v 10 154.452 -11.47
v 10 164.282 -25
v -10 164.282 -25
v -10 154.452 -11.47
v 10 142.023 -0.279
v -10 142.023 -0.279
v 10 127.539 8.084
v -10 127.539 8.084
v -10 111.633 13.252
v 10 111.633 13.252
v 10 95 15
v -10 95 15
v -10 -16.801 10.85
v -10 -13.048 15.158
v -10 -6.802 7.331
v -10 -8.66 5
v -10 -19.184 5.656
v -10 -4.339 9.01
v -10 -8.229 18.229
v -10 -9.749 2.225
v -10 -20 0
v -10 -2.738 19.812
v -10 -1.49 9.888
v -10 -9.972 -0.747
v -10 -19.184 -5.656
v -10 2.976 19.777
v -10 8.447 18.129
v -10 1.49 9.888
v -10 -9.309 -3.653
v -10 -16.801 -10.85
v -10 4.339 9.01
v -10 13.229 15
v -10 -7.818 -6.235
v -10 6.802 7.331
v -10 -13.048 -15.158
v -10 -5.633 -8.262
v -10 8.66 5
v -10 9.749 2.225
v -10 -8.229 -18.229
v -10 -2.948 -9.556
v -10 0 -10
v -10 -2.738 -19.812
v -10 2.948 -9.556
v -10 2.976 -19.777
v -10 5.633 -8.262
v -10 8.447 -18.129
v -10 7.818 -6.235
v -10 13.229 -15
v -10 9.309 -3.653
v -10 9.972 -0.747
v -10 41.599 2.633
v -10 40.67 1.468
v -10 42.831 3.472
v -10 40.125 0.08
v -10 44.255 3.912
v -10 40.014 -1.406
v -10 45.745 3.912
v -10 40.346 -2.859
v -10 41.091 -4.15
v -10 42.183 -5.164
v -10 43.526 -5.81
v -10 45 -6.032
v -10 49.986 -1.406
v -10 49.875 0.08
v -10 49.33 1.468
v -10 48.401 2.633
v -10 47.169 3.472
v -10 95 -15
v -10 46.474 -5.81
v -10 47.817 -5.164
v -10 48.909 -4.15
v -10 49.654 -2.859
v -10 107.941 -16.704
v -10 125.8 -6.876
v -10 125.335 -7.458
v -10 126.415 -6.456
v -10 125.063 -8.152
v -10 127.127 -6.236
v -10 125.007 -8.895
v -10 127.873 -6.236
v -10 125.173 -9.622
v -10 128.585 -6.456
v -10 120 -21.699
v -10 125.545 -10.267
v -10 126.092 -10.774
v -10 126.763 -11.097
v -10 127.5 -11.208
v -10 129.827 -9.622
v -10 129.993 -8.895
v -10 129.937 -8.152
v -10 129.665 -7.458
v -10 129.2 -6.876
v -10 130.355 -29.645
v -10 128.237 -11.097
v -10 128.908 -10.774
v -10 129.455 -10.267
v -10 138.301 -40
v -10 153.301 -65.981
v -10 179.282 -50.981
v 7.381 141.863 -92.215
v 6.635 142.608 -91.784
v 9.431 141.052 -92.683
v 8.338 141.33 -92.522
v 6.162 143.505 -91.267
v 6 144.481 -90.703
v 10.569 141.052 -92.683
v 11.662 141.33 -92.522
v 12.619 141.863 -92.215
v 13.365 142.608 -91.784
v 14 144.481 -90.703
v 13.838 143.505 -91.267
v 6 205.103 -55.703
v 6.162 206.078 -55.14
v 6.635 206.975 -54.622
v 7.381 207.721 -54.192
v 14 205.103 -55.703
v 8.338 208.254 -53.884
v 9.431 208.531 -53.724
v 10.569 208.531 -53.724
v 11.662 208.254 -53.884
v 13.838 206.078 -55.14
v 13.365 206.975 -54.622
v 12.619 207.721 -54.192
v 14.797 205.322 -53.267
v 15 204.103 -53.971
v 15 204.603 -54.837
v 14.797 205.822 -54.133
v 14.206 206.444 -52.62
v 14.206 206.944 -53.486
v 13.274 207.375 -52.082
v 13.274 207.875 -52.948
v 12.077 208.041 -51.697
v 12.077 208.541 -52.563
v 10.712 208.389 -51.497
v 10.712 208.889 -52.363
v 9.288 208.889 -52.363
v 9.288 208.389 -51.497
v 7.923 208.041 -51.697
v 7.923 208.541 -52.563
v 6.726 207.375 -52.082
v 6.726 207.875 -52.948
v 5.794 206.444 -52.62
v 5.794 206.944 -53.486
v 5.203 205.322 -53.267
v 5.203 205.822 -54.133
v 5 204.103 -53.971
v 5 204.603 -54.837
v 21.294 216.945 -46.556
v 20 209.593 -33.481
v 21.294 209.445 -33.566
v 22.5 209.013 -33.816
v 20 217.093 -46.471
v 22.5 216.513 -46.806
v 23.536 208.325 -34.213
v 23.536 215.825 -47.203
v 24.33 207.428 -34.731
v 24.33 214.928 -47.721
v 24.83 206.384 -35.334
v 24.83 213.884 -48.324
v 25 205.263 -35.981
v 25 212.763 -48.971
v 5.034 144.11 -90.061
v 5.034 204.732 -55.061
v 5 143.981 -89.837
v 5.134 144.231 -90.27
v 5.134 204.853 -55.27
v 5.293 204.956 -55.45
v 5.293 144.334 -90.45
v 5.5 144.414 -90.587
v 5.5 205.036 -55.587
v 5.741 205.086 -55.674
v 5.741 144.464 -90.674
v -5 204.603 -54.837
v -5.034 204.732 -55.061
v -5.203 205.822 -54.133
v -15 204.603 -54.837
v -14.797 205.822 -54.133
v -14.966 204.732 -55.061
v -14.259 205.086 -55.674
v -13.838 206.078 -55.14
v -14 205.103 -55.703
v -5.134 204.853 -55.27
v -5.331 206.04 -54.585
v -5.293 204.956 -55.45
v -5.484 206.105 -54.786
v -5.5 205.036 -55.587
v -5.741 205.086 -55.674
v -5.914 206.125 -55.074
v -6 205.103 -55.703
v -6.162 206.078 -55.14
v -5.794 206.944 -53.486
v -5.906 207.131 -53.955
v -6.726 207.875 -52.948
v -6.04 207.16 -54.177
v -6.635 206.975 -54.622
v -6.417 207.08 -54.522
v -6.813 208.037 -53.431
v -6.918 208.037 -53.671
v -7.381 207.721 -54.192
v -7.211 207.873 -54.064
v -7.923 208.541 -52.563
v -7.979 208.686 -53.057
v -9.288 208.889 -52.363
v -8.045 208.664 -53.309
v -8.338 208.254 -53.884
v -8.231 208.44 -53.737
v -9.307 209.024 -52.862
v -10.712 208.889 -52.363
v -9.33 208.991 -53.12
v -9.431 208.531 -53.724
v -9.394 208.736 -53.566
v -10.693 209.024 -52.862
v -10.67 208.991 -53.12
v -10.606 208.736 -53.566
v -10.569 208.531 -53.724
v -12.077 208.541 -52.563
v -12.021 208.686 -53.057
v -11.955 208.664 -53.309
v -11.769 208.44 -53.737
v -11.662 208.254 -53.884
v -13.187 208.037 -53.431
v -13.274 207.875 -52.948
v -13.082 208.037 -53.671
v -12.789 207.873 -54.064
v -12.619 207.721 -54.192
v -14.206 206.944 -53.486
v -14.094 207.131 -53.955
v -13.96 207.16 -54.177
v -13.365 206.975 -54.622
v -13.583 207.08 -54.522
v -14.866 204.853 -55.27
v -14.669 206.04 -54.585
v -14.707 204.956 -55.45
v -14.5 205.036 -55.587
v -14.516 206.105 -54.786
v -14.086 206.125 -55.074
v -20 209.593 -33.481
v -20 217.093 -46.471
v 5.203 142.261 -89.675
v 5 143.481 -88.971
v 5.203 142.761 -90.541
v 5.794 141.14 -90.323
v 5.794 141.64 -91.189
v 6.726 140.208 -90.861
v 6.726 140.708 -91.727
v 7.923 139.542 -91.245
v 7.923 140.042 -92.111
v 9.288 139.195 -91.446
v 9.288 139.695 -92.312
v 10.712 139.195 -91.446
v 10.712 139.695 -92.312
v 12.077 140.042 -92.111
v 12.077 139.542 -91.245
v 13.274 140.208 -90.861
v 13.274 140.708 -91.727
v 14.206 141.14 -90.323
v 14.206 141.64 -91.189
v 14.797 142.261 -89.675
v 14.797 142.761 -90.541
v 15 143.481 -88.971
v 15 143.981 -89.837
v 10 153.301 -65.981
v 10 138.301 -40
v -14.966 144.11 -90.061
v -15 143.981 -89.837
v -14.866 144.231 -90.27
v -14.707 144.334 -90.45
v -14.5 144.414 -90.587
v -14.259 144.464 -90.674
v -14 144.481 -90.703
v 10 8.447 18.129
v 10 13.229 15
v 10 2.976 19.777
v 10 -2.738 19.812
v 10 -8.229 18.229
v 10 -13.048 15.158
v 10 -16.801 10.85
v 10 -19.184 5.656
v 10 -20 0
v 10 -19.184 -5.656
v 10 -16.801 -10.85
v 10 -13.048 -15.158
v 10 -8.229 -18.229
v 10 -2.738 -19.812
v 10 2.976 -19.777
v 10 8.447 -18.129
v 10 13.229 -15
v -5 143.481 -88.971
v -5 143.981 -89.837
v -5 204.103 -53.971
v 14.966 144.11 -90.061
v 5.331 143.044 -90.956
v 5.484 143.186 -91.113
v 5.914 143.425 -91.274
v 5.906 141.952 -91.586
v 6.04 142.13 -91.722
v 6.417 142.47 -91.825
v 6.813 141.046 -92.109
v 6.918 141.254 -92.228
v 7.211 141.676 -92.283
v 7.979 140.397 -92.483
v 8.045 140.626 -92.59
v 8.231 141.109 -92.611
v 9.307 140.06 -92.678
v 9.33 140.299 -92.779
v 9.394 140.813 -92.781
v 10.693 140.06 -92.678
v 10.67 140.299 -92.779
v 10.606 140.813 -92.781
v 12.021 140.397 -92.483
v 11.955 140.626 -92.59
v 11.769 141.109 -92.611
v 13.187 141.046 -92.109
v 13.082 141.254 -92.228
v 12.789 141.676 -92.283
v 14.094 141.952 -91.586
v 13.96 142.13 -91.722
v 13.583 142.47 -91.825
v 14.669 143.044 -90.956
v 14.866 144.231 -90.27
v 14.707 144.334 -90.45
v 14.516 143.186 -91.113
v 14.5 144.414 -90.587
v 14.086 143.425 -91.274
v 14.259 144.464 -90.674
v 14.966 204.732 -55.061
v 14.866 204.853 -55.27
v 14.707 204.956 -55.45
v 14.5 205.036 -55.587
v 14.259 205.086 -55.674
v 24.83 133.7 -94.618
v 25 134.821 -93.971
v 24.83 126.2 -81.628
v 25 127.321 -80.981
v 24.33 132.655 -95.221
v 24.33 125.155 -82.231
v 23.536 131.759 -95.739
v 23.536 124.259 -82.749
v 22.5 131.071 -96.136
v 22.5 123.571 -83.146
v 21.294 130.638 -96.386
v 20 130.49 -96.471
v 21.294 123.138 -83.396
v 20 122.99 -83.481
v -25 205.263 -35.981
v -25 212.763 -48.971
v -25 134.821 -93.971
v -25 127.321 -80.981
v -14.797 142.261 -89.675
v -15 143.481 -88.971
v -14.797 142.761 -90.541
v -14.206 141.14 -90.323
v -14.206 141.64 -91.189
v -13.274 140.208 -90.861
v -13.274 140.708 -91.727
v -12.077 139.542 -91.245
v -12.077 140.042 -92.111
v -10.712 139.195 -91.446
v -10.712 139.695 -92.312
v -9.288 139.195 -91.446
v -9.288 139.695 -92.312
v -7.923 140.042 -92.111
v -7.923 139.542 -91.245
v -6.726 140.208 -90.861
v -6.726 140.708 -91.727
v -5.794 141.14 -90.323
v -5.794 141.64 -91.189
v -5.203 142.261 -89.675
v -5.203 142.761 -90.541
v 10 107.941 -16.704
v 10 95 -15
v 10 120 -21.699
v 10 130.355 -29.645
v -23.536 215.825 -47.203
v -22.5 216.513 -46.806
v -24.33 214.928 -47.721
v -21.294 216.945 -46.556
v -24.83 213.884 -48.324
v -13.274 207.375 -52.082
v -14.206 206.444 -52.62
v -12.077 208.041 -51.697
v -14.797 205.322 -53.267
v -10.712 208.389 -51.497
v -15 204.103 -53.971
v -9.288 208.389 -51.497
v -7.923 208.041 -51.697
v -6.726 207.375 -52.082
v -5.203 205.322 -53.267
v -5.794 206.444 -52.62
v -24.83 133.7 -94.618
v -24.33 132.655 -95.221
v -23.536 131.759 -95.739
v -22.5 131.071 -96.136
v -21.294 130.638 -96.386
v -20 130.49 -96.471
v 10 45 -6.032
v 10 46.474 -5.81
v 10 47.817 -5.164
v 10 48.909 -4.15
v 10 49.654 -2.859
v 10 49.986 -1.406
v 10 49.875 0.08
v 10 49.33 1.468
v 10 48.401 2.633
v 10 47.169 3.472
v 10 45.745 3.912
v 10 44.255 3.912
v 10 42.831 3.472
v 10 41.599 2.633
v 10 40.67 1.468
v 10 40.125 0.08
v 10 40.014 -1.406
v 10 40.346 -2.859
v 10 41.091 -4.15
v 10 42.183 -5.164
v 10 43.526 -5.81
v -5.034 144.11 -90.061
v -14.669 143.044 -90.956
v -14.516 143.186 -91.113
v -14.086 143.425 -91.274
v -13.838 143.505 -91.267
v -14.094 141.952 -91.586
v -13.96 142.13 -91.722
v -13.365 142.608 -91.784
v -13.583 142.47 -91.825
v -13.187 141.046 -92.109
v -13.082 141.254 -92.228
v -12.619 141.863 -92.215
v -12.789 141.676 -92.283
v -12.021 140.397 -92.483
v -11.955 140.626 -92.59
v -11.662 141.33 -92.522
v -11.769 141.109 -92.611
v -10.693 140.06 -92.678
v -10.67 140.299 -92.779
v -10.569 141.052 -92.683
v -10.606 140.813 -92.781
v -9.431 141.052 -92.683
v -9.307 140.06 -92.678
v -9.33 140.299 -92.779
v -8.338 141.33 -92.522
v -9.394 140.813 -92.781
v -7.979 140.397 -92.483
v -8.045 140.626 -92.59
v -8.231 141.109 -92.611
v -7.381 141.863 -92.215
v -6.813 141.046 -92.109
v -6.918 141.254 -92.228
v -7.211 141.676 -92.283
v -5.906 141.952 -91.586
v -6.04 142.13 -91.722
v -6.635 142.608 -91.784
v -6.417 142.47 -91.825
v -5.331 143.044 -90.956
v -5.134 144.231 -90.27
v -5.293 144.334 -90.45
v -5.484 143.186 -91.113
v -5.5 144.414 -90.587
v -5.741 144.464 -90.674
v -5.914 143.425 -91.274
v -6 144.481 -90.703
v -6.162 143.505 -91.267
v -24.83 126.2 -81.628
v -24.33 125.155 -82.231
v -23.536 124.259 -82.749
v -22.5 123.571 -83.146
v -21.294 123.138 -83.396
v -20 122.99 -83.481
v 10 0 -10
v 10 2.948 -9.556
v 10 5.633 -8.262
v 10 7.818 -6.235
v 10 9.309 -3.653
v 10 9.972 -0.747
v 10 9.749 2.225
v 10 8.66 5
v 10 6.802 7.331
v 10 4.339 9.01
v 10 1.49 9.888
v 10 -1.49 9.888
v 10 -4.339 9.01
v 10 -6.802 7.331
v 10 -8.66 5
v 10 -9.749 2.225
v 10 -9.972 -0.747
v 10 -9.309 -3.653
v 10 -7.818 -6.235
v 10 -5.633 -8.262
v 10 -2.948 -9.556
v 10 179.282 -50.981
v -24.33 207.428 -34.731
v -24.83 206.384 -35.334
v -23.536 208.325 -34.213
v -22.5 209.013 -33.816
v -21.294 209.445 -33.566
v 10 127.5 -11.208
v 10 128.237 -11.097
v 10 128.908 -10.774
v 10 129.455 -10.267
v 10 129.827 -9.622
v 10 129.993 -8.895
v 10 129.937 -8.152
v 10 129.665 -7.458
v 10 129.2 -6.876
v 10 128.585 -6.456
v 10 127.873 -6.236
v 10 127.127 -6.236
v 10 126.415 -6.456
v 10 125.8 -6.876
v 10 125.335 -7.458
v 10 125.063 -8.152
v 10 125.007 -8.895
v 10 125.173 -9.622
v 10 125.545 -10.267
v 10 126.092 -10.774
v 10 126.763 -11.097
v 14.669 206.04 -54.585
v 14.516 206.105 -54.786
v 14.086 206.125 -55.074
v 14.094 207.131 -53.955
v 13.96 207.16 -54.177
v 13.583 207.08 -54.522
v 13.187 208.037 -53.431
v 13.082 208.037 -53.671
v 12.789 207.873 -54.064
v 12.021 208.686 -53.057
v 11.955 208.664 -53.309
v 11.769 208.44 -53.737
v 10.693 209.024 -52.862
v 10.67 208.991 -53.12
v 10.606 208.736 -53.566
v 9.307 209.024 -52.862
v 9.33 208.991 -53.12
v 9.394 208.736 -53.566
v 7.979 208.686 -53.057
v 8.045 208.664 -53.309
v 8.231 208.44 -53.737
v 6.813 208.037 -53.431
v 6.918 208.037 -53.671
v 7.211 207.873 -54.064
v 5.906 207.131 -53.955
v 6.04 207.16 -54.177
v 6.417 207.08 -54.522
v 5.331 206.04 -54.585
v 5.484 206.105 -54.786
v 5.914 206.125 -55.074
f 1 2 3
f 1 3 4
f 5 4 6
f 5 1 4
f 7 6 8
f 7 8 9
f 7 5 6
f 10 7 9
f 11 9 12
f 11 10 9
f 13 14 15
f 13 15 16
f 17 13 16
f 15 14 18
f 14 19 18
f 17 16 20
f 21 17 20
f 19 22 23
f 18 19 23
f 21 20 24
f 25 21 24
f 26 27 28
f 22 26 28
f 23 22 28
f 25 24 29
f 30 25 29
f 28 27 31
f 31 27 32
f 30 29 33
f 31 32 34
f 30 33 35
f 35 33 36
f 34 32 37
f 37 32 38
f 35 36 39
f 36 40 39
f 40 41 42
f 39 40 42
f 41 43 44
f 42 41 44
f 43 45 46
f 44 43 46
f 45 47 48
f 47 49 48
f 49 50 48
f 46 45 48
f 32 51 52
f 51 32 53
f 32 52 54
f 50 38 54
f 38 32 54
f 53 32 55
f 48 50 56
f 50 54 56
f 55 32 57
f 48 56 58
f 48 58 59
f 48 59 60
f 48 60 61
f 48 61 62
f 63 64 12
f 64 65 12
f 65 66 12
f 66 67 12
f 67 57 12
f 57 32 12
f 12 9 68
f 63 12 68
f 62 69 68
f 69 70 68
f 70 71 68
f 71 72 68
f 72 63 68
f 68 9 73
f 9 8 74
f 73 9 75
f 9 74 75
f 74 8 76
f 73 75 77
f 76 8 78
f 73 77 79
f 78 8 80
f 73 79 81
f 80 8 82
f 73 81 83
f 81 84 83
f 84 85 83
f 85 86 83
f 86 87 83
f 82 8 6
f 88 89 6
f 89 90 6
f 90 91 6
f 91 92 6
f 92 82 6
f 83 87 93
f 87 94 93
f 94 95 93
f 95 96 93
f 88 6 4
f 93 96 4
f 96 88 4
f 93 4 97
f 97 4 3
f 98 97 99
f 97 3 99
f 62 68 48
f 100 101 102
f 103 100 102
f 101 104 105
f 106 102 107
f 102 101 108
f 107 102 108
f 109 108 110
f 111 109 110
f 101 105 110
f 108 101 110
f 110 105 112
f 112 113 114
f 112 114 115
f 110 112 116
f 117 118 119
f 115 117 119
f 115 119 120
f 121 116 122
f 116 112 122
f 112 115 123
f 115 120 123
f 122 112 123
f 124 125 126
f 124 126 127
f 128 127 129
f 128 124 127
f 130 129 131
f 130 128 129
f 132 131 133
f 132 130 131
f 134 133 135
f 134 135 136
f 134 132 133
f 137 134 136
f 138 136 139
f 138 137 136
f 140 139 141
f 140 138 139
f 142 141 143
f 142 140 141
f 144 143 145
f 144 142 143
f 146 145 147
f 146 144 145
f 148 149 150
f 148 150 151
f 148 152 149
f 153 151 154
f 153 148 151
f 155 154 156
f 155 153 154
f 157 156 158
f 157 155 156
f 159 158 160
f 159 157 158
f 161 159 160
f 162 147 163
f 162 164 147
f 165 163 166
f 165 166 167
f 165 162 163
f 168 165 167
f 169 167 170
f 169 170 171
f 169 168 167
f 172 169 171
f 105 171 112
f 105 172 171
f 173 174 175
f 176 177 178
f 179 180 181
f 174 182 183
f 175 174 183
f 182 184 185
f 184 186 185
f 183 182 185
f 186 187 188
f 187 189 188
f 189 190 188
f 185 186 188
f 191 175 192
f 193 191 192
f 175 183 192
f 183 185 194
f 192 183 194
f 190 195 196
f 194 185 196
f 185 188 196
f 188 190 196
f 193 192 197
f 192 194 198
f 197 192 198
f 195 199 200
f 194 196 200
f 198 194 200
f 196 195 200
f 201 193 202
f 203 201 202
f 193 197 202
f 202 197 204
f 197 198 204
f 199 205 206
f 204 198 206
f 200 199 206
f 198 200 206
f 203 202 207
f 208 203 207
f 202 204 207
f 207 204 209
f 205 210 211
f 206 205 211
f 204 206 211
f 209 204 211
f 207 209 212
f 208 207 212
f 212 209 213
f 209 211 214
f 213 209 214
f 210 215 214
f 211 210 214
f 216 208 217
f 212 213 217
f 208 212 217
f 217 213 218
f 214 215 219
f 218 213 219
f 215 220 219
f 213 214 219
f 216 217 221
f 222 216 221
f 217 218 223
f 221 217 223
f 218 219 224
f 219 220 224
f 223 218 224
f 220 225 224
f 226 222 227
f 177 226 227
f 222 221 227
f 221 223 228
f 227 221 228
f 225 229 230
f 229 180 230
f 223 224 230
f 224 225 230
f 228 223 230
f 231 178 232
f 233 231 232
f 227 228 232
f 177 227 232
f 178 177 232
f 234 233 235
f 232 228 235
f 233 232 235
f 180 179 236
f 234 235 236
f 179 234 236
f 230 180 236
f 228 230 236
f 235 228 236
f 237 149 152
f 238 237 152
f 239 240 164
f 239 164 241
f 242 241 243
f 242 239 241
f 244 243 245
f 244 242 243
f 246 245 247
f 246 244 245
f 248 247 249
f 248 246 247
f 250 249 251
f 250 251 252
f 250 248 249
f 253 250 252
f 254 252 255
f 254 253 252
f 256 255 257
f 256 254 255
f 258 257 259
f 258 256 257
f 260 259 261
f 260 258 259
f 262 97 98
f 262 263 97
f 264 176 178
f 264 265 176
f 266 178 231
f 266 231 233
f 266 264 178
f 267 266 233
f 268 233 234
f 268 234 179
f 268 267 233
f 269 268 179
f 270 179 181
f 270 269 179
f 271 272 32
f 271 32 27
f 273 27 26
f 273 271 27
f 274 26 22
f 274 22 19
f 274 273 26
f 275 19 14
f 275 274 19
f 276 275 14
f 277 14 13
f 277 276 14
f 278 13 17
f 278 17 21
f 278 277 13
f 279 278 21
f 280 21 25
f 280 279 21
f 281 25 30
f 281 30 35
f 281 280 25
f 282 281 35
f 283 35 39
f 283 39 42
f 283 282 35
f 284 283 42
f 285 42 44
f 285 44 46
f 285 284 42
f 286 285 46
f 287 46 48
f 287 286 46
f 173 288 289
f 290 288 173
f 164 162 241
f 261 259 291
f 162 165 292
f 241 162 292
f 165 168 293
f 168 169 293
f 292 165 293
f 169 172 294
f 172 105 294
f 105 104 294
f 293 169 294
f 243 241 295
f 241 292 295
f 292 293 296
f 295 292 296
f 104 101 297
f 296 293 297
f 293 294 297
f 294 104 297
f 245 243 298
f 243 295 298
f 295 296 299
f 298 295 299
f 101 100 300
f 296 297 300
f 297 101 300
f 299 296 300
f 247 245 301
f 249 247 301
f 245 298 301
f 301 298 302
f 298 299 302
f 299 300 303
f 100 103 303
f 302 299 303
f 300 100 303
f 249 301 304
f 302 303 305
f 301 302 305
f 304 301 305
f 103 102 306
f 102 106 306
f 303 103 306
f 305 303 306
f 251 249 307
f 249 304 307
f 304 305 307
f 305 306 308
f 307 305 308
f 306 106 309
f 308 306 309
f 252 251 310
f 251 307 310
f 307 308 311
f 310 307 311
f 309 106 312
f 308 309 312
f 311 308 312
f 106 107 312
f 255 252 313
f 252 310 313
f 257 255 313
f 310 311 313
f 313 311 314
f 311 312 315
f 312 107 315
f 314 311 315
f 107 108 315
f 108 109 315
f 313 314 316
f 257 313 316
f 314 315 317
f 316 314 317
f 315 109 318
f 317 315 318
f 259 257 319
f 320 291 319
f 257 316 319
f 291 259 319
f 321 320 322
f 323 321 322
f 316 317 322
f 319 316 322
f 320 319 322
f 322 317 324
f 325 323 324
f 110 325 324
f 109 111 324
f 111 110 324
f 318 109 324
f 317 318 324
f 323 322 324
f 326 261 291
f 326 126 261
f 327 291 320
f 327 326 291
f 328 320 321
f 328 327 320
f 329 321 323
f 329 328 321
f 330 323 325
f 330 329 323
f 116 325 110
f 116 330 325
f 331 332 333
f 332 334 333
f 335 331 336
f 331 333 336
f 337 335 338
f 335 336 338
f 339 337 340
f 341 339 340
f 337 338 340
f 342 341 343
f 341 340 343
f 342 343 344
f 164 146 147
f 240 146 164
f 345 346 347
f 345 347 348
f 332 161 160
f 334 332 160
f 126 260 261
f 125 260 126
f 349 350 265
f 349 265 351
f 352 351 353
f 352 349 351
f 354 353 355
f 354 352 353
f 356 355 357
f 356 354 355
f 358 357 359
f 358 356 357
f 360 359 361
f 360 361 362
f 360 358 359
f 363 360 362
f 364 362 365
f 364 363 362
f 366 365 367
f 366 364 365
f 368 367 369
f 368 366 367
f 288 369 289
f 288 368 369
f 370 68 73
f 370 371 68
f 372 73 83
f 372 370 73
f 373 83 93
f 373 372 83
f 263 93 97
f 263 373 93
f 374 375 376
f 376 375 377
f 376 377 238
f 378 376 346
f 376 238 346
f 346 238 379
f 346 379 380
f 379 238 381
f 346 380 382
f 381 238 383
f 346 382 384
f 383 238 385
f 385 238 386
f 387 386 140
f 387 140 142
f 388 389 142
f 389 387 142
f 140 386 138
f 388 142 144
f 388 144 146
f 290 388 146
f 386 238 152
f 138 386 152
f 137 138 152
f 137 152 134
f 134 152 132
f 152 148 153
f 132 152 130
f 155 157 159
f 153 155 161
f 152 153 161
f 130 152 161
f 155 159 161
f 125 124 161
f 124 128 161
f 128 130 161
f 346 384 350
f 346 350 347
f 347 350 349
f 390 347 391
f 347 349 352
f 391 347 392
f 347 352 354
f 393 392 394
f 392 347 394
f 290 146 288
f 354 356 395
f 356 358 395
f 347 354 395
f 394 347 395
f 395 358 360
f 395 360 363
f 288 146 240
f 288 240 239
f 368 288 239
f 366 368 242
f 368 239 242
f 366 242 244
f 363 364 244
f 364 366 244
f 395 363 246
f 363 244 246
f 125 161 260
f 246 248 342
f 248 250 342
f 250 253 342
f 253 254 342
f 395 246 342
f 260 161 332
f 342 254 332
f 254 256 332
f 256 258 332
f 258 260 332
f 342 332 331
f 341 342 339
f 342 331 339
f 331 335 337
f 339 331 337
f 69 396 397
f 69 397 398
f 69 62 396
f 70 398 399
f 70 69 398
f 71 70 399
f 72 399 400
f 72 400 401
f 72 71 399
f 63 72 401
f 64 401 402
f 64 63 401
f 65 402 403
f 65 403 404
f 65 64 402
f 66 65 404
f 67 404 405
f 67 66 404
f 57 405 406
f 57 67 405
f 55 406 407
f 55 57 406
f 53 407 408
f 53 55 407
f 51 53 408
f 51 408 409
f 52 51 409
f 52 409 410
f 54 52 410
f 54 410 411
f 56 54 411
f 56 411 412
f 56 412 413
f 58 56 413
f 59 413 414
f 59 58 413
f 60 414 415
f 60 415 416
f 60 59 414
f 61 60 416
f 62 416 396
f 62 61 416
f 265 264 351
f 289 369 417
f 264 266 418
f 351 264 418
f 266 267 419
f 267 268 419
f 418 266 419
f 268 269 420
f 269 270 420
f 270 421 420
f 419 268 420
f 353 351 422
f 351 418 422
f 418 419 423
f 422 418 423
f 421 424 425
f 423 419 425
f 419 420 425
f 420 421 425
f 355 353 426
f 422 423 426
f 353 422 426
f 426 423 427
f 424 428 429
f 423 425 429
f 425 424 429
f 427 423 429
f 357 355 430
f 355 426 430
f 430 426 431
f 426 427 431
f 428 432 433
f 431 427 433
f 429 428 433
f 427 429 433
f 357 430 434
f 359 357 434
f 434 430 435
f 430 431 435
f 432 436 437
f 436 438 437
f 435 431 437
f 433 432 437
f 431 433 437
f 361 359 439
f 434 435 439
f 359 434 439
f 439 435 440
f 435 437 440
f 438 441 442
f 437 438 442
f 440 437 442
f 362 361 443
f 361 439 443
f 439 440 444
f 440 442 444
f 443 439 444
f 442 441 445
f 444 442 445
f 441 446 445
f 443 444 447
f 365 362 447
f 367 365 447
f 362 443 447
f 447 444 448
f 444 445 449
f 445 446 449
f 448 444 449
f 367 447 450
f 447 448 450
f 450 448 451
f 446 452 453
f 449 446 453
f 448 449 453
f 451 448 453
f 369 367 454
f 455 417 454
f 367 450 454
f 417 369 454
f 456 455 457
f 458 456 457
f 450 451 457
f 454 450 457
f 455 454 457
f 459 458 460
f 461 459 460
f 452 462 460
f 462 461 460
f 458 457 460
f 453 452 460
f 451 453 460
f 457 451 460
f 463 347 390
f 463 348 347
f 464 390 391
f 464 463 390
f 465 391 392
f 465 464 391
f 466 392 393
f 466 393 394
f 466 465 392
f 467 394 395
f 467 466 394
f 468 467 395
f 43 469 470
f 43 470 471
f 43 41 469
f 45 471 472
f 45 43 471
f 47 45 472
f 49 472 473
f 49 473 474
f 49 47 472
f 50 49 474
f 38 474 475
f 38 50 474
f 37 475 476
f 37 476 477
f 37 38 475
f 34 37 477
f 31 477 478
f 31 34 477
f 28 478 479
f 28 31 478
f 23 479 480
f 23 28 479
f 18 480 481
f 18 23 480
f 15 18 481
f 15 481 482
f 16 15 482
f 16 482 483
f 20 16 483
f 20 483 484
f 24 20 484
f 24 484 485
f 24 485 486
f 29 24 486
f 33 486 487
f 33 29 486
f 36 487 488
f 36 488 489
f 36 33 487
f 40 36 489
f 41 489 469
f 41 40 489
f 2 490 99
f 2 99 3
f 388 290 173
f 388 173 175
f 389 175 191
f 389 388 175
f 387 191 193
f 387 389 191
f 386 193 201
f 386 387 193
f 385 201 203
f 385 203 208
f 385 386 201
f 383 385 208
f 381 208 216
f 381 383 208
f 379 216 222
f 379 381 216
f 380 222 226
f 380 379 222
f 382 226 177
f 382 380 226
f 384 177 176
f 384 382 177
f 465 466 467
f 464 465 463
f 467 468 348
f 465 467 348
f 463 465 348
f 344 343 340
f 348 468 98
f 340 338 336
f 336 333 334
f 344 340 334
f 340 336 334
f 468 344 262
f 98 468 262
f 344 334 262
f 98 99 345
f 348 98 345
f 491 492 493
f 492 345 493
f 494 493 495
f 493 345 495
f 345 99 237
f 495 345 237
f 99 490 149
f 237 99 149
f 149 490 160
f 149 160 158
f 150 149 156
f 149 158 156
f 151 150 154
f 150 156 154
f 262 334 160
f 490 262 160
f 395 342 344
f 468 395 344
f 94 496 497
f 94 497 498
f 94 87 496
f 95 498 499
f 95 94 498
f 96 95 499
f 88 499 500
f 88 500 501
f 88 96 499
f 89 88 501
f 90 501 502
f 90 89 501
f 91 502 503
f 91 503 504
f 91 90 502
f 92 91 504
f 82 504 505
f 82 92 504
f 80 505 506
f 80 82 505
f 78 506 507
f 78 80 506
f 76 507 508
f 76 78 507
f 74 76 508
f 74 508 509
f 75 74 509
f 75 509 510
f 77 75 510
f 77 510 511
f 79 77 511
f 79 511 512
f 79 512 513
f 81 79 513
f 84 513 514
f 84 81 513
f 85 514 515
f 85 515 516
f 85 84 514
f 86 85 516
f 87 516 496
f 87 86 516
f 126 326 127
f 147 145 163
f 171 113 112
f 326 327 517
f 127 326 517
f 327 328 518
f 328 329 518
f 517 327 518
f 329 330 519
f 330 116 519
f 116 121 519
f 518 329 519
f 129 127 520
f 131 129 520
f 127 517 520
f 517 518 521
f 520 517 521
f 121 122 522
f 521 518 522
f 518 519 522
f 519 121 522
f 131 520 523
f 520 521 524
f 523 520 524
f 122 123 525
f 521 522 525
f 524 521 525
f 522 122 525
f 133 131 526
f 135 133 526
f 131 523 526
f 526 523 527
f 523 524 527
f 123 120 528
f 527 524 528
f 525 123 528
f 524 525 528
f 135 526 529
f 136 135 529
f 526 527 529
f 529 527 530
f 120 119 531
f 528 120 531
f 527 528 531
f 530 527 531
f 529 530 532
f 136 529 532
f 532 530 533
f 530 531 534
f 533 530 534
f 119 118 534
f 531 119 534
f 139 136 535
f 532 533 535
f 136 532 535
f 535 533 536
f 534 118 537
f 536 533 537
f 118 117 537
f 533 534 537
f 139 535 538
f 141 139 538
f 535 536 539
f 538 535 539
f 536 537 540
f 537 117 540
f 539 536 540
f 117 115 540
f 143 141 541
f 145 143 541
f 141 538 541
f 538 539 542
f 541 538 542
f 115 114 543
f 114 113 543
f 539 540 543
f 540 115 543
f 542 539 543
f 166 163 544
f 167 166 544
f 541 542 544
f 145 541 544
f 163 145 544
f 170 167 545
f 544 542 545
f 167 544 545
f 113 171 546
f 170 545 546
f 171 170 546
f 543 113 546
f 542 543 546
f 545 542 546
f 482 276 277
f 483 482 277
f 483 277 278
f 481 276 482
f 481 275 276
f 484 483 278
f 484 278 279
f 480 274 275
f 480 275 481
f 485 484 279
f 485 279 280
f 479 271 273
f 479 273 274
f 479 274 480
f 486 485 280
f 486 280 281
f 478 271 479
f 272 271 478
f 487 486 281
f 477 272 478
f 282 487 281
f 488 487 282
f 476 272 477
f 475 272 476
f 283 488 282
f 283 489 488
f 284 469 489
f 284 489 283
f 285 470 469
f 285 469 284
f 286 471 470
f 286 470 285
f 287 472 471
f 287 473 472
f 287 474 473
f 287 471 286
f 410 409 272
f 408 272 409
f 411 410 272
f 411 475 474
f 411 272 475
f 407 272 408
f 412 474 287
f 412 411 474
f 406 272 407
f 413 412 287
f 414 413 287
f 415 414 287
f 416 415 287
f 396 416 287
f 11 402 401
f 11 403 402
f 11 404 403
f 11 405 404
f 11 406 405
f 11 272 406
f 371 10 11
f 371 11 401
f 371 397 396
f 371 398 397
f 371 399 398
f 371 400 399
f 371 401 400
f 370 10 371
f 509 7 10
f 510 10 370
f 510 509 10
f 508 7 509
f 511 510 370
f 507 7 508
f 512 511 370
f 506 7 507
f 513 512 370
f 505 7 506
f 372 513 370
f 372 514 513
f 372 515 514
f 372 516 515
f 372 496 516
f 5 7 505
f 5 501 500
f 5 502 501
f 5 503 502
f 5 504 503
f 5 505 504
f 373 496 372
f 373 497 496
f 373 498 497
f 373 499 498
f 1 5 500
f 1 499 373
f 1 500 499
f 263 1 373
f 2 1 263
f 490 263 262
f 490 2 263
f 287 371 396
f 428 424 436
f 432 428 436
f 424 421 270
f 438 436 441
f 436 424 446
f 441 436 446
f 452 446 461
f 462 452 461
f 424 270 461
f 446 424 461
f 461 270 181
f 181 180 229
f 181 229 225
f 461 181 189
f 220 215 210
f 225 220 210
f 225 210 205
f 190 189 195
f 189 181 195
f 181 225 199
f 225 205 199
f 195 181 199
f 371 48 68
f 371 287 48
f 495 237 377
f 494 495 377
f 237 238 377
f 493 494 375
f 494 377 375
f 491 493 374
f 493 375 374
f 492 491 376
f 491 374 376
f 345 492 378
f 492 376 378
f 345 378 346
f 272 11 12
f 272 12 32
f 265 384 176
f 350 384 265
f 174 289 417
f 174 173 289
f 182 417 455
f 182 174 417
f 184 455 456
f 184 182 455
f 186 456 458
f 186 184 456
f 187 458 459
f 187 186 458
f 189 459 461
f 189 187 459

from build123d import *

# Parameters (mm, degrees)
SKETCH3_R           = 10
SKETCH3_R_2         = 5
SKETCH3_R_3         = 2.5
BOSS_EXTRUDE1_DEPTH = 10
BOSS_EXTRUDE2_DEPTH = 25
FILLET1_R           = 5
BOSS_EXTRUDE4_DEPTH = 2
FILLET6_R           = 1


with BuildPart() as part:
    # Sketch3 → Boss-Extrude1 (new, symmetric)
    with BuildSketch(Plane(origin=(0, 0, 0), x_dir=(0, 0, -1), z_dir=(1, 0, 0))):
        with BuildLine():
            Line((65.980762114, 153.301270189), (50.980762114, 179.282032303))
            Line((50.980762114, 179.282032303), (25, 164.282032303))
            ThreePointArc((25, 164.282032303), (-4.282032303, 135), (-15, 95))
            Line((-15, 95), (-15, 13.228756555))
            ThreePointArc((-15, 13.228756555), (0, -20), (15, 13.228756555))
            Line((15, 13.228756555), (15, 95))
            ThreePointArc((15, 95), (21.698729811, 120), (40, 138.301270189))
            Line((40, 138.301270189), (65.980762114, 153.301270189))
        make_face()
        Circle(SKETCH3_R, mode=Mode.SUBTRACT)
        with Locations((1.032464383, 45)):
            Circle(SKETCH3_R_2, mode=Mode.SUBTRACT)
        with Locations((8.708348754, 127.5)):
            Circle(SKETCH3_R_3, mode=Mode.SUBTRACT)
    extrude(amount=BOSS_EXTRUDE1_DEPTH, both=True)

    # Sketch3<3> → Boss-Extrude2 (add, symmetric)
    with BuildSketch(Plane(origin=(0, 0, 0), x_dir=(0, 0, -1), z_dir=(1, 0, 0))):
        Polygon((96.47114317, 130.490381057), (46.47114317, 217.092921435), (33.480762114, 209.592921435), (50.980762114, 179.282032303), (65.980762114, 153.301270189), (83.480762114, 122.990381057), align=None)
    extrude(amount=BOSS_EXTRUDE2_DEPTH, both=True)

    # Fillet1
    fillet1_edges = [part.edges().sort_by_distance(p)[0] for p in [
        (25, 213.342921435, -39.975952642),
        (-25, 213.342921435, -39.975952642),
        (-25, 126.740381057, -89.975952642),
        (25, 126.740381057, -89.975952642),
    ]]
    fillet(fillet1_edges, radius=FILLET1_R)

    # Sketch6 → Boss-Extrude4 (add)
    with BuildSketch(Plane(origin=(0, 74.395825623, -128.85734985), x_dir=(-1, 0, 0), z_dir=(0, 0.4999999999999983, -0.8660254037844397))):
        with BuildLine():
            Line((-5, 149.77241336), (-5, 79.77241336))
            ThreePointArc((-5, 79.77241336), (-10, 74.77241336), (-15, 79.77241336))
            Line((-15, 79.77241336), (-15, 149.77241336))
            ThreePointArc((-15, 149.77241336), (-10, 154.77241336), (-5, 149.77241336))
        make_face()
        with BuildLine():
            Line((15, 149.77241336), (15, 79.77241336))
            ThreePointArc((15, 79.77241336), (10, 74.77241336), (5, 79.77241336))
            Line((5, 79.77241336), (5, 149.77241336))
            ThreePointArc((5, 149.77241336), (10, 154.77241336), (15, 149.77241336))
        make_face()
    extrude(amount=BOSS_EXTRUDE4_DEPTH)

    # Fillet6
    fillet6_edges = [part.edges().sort_by_distance(p)[0] for p in [
        (-10, 209.432667397, -53.203193978),
        (-15, 174.791651246, -73.203193978),
        (-10, 140.150635095, -93.203193978),
        (10, 209.432667397, -53.203193978),
        (5, 174.791651246, -73.203193978),
        (10, 140.150635095, -93.203193978),
        (-5, 174.791651246, -73.203193978),
        (15, 174.791651246, -73.203193978),
    ]]
    fillet(fillet6_edges, radius=FILLET6_R)


solid = part.part
